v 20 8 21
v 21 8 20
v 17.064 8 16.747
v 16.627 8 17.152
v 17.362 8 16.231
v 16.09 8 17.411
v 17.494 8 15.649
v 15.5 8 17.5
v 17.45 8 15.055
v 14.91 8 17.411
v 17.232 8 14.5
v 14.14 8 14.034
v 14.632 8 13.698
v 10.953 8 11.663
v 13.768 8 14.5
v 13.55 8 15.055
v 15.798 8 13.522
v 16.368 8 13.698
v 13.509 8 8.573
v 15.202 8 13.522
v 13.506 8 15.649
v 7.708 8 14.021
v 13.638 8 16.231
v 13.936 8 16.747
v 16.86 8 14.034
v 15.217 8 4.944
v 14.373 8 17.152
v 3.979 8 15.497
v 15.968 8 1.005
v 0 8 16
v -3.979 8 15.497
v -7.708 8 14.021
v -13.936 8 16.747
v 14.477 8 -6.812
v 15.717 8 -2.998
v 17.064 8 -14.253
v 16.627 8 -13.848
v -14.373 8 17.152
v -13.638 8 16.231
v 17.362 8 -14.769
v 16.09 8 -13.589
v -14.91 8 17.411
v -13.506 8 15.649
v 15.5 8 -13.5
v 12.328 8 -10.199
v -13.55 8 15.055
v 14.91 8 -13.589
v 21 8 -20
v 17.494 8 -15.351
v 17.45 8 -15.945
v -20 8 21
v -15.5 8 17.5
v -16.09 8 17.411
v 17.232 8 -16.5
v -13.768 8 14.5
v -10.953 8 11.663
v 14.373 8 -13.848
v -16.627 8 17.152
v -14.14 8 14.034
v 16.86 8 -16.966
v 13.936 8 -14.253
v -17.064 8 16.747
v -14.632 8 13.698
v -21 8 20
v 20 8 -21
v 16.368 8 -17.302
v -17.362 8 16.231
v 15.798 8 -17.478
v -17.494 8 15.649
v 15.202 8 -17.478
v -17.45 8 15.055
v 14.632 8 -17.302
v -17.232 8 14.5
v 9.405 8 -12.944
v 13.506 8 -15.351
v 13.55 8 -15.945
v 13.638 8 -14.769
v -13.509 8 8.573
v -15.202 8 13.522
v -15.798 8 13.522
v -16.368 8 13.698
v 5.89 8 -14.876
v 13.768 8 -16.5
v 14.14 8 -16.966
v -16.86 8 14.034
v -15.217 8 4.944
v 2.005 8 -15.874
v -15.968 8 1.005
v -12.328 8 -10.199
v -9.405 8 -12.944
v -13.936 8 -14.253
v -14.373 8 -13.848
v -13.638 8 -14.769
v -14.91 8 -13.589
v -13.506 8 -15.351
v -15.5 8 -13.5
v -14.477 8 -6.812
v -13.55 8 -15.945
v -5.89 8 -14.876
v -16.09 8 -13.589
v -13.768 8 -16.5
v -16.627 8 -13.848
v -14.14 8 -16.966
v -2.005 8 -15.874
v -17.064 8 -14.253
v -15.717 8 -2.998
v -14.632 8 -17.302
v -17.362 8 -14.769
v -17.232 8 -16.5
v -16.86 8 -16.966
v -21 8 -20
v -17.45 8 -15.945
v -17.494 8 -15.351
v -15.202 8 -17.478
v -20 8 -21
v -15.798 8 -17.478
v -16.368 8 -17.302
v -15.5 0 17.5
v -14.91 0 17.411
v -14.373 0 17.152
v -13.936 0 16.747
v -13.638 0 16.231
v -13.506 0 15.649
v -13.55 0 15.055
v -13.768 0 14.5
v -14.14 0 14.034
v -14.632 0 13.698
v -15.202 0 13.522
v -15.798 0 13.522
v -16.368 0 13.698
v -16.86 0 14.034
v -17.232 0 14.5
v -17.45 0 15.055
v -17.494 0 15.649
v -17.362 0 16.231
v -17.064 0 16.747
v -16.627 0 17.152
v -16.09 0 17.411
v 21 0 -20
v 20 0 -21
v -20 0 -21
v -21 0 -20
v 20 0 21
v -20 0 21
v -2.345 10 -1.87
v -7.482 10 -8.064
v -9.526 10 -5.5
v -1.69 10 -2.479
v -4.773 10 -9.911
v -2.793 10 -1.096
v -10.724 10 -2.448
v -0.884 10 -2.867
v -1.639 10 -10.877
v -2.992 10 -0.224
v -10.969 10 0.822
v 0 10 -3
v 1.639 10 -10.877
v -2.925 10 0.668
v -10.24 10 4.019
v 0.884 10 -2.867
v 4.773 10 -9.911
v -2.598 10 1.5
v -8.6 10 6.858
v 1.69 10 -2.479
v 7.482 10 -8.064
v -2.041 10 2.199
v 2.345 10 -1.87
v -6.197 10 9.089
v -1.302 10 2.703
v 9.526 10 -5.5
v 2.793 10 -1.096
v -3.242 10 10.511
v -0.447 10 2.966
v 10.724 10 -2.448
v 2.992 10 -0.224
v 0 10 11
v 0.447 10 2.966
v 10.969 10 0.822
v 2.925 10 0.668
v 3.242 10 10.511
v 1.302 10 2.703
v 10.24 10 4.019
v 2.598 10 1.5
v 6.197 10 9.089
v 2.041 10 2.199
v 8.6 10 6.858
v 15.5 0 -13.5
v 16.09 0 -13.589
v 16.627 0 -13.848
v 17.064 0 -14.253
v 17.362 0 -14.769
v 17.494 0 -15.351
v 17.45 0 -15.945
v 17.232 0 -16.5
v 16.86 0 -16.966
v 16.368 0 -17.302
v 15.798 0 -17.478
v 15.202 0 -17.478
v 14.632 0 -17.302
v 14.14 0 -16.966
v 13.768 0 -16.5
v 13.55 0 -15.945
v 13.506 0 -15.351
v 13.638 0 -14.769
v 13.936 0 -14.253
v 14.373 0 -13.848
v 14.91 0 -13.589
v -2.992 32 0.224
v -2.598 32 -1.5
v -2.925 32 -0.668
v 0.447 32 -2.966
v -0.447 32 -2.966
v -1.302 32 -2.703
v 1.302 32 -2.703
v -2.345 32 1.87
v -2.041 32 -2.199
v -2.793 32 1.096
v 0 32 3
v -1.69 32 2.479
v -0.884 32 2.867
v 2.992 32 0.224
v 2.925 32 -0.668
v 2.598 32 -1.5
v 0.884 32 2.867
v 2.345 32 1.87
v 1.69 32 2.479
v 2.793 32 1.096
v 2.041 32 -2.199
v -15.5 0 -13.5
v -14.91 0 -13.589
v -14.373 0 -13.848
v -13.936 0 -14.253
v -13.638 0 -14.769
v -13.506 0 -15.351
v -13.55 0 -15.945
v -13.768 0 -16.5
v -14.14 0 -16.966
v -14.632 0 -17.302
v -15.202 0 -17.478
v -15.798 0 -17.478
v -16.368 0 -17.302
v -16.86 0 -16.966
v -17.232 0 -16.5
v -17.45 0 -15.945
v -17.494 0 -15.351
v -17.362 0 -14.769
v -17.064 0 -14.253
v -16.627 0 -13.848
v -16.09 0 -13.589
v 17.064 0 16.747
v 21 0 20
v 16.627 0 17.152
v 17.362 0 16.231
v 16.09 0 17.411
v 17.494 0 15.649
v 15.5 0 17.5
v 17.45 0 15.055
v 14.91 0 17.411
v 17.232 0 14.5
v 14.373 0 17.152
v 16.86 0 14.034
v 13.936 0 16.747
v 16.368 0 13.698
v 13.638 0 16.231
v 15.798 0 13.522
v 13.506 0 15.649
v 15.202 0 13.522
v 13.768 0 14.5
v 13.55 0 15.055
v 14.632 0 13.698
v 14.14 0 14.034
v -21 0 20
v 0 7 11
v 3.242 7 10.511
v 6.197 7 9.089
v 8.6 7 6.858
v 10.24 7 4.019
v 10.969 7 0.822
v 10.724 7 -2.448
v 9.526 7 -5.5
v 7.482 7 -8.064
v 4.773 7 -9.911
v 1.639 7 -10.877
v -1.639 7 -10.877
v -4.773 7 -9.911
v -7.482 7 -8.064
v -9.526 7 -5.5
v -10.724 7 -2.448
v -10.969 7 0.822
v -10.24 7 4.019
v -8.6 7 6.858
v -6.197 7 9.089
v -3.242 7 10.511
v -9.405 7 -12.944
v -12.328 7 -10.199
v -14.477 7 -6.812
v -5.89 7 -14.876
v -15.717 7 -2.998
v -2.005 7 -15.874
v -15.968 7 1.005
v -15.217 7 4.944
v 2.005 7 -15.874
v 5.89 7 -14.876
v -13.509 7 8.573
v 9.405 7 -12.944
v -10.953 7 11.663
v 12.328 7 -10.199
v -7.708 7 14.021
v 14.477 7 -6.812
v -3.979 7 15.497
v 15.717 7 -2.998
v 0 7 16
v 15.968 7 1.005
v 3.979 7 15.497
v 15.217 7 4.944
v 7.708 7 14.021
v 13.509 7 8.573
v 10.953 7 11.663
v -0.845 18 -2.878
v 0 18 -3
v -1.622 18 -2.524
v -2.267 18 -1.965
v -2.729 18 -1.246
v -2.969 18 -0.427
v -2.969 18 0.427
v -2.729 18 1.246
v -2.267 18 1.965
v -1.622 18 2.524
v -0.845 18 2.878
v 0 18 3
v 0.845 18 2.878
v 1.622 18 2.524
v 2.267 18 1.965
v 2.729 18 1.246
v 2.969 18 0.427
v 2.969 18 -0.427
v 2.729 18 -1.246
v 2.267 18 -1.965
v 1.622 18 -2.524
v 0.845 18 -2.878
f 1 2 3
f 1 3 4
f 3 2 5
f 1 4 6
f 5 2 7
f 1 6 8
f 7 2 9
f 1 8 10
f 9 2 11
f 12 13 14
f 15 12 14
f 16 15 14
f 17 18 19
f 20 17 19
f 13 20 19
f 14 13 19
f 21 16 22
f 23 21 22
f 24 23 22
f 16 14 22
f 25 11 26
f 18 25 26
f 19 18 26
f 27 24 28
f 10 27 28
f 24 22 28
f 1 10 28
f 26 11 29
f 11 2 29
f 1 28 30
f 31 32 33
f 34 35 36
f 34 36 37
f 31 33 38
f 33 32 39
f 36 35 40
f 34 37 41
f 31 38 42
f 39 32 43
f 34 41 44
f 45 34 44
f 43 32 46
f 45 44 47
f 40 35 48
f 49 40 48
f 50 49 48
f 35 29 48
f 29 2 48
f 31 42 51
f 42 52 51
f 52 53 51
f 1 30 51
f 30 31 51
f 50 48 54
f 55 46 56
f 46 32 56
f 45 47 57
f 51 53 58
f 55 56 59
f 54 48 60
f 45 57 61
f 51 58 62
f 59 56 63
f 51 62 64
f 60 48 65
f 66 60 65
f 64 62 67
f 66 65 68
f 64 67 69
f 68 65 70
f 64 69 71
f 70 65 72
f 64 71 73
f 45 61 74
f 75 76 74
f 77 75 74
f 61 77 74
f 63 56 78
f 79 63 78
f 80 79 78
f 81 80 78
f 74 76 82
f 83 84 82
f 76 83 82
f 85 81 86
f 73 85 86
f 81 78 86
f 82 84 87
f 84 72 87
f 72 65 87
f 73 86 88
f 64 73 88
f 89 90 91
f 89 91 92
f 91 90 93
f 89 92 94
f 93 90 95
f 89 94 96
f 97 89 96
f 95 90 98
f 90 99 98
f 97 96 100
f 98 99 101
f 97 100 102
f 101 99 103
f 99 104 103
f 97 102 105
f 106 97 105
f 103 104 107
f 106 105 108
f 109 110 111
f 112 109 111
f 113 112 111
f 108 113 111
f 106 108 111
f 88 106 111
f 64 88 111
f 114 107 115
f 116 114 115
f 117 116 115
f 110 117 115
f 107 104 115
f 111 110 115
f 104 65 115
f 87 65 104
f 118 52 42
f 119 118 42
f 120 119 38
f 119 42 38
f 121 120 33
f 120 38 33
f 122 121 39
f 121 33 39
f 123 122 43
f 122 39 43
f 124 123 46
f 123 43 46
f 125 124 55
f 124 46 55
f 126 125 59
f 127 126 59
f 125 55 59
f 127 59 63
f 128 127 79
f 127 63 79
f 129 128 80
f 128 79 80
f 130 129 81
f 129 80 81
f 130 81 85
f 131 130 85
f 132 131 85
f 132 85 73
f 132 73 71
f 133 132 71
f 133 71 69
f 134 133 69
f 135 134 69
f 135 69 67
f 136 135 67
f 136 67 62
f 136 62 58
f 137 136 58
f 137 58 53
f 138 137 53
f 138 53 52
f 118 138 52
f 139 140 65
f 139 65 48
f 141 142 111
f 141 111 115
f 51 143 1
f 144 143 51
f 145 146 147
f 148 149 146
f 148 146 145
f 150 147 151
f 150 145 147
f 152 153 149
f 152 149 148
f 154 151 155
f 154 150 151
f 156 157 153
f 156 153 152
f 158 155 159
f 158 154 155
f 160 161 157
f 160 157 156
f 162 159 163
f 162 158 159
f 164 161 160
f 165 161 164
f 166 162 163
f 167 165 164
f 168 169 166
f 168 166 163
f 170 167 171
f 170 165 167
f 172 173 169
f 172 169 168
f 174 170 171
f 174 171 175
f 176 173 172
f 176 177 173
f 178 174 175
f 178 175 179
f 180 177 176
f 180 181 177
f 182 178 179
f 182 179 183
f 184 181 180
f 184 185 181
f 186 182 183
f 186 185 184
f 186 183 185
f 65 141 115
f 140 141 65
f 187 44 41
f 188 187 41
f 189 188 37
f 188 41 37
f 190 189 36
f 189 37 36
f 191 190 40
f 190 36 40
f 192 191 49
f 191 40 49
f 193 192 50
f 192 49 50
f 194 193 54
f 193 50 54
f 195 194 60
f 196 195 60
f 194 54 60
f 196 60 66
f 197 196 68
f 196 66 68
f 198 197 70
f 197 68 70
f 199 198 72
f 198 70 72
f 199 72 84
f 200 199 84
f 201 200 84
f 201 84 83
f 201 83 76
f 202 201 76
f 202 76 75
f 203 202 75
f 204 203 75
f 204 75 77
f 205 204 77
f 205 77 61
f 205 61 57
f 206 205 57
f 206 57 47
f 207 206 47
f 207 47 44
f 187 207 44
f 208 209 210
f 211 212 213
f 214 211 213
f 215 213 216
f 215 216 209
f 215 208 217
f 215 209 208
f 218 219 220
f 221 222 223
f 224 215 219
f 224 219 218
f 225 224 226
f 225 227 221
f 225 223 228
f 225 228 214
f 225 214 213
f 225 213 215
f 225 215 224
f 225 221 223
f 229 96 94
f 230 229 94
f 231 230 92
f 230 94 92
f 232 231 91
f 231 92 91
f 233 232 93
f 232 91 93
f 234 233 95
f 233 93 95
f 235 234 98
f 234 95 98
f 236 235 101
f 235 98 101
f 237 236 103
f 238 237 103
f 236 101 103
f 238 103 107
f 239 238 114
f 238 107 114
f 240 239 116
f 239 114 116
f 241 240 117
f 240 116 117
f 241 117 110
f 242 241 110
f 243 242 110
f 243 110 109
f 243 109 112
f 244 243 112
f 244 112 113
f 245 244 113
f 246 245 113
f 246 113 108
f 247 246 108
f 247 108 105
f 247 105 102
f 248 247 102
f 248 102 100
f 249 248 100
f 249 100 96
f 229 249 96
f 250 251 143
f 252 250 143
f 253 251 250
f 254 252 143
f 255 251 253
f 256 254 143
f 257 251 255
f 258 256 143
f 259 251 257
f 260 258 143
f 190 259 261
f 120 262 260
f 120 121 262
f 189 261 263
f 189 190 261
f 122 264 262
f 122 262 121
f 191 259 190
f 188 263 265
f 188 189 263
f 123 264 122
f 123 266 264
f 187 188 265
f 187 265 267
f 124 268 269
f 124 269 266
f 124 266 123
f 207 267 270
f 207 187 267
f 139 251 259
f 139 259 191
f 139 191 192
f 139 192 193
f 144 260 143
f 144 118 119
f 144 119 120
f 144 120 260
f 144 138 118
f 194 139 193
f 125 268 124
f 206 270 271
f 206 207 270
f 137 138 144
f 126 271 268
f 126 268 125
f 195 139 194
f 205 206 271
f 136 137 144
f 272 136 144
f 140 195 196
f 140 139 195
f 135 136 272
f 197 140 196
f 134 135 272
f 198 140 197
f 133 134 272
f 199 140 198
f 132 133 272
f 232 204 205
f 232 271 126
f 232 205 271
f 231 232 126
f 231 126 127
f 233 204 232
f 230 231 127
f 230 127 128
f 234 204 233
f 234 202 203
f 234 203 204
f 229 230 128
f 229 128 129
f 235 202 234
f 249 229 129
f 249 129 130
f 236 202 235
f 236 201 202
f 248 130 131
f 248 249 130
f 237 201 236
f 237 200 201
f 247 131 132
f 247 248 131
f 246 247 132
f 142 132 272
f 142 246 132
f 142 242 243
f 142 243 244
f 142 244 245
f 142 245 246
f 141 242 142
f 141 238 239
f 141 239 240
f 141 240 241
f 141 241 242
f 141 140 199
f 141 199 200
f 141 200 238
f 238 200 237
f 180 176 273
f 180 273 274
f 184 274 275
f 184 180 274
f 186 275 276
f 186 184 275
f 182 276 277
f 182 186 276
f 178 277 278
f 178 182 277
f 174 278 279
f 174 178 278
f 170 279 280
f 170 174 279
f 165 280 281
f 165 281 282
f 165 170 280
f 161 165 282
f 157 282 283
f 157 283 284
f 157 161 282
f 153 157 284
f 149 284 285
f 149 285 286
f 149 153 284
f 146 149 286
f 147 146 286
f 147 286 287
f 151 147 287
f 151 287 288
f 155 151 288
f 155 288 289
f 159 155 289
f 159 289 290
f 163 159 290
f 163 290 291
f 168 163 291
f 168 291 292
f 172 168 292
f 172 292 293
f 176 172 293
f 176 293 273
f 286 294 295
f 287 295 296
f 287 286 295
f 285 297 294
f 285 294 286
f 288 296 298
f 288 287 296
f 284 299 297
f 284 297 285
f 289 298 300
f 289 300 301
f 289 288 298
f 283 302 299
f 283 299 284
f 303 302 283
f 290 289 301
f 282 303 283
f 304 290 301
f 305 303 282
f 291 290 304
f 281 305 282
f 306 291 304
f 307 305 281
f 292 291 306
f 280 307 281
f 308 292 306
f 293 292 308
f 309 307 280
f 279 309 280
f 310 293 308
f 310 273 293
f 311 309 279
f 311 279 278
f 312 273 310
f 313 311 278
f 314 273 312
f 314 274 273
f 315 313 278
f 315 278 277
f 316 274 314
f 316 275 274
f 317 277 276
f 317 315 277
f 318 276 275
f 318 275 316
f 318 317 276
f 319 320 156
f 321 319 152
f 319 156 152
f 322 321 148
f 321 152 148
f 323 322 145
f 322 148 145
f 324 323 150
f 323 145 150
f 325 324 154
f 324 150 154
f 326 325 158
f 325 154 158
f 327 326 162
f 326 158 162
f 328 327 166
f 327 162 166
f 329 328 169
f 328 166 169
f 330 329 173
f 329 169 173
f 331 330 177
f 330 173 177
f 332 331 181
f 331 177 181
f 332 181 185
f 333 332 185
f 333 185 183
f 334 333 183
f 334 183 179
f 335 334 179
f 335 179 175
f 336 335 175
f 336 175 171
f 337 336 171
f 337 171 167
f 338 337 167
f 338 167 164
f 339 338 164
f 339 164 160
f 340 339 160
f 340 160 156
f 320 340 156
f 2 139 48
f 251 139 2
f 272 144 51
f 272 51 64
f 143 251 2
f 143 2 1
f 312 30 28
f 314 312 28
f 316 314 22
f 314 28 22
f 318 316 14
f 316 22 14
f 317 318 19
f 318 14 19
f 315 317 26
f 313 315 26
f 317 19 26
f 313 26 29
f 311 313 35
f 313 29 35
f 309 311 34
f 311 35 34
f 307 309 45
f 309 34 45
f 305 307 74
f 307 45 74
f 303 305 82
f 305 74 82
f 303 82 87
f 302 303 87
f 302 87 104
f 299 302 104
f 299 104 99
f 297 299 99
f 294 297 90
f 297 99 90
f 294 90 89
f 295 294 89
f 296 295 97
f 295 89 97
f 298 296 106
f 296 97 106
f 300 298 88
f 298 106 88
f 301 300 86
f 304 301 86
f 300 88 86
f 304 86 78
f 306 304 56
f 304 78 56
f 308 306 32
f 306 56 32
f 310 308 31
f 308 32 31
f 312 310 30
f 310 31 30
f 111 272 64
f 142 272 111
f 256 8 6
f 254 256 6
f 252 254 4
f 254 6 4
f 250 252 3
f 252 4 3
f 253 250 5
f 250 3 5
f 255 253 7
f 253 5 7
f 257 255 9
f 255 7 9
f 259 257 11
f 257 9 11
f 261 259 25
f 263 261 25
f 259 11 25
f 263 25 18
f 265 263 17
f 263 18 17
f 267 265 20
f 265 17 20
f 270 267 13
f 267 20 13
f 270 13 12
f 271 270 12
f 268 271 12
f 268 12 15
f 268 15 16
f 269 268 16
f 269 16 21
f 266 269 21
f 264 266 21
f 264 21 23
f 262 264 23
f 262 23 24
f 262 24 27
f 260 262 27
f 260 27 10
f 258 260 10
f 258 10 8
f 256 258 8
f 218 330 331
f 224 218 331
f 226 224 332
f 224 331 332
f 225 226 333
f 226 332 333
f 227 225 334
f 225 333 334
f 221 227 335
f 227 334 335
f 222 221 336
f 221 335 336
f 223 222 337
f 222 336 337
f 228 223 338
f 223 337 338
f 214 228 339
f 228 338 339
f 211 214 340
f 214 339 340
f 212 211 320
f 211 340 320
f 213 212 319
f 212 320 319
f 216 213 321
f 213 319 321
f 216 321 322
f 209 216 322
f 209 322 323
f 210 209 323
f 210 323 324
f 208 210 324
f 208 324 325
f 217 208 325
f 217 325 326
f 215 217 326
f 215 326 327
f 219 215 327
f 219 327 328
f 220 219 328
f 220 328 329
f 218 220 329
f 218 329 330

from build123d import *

# Parameters (mm, degrees)
BOSS_EXTRUDE1_DEPTH = 8
SKETCH2_R           = 16
SKETCH2_R_2         = 11
CUT_EXTRUDE1_DEPTH  = 1
SKETCH3_R           = 3
BOSS_EXTRUDE2_DEPTH = 10
SKETCH4_R           = 2
CUT_EXTRUDE2_DEPTH  = 32.336879232
BOSS_EXTRUDE4_START = 2
SKETCH5_R           = 11
BOSS_EXTRUDE4_DEPTH = 2
SKETCH6_R           = 3
BOSS_EXTRUDE5_DEPTH = 14


with BuildPart() as part:
    # Sketch1 → Boss-Extrude1 (new body)
    with BuildSketch(Plane(origin=(0, 0, 0), x_dir=(1, 0, 0), z_dir=(0, 1, 0))):
        Polygon((-21, 20), (-20, 21), (20, 21), (21, 20), (21, -20), (20, -21), (-20, -21), (-21, -20), align=None)
    extrude(amount=BOSS_EXTRUDE1_DEPTH)

    # Sketch2 → Cut-Extrude1 (cut)
    with BuildSketch(Plane(origin=(0, 8, 0), x_dir=(1, 0, 0), z_dir=(0, 1, 0))):
        with Locations(Location((0, 0, 0), (0, 0, 270))):
            Circle(SKETCH2_R)
        with Locations(Location((0, 0, 0), (0, 0, 270))):
            Circle(SKETCH2_R_2, mode=Mode.SUBTRACT)
    extrude(amount=-CUT_EXTRUDE1_DEPTH, mode=Mode.SUBTRACT)

    # Sketch3 → Boss-Extrude2 (add)
    with BuildSketch(Plane(origin=(0, 8, 0), x_dir=(1, 0, 0), z_dir=(0, 1, 0))):
        with Locations(Location((0, 0, 0), (0, 0, 90))):
            Circle(SKETCH3_R)
    extrude(amount=BOSS_EXTRUDE2_DEPTH)

    # Sketch4 → Cut-Extrude2 (cut, through all)
    with BuildSketch(Plane(origin=(0, 8, 0), x_dir=(1, 0, 0), z_dir=(0, 1, 0))):
        with Locations(Location((-15.5, 15.5, 0), (0, 0, 270))):
            Circle(SKETCH4_R)
        with Locations(Location((15.5, 15.5, 0), (0, 0, 270))):
            Circle(SKETCH4_R)
        with Locations(Location((15.5, -15.5, 0), (0, 0, 270))):
            Circle(SKETCH4_R)
        with Locations(Location((-15.5, -15.5, 0), (0, 0, 270))):
            Circle(SKETCH4_R)
    extrude(amount=-CUT_EXTRUDE2_DEPTH, mode=Mode.SUBTRACT)

    # Sketch5 → Boss-Extrude4 (add)
    with BuildSketch(Plane(origin=(0, 8, 0), x_dir=(1, 0, 0), z_dir=(0, 1, 0)).offset(BOSS_EXTRUDE4_START)):
        with Locations(Location((0, 0, 0), (0, 0, 270))):
            Circle(SKETCH5_R)
    extrude(amount=-BOSS_EXTRUDE4_DEPTH)

    # Sketch6 → Boss-Extrude5 (add)
    with BuildSketch(Plane(origin=(0, 18, 0), x_dir=(1, 0, 0), z_dir=(0, 1, 0))):
        with Locations(Location((0, 0, 0), (0, 0, 270))):
            Circle(SKETCH6_R)
    extrude(amount=BOSS_EXTRUDE5_DEPTH)


solid = part.part
